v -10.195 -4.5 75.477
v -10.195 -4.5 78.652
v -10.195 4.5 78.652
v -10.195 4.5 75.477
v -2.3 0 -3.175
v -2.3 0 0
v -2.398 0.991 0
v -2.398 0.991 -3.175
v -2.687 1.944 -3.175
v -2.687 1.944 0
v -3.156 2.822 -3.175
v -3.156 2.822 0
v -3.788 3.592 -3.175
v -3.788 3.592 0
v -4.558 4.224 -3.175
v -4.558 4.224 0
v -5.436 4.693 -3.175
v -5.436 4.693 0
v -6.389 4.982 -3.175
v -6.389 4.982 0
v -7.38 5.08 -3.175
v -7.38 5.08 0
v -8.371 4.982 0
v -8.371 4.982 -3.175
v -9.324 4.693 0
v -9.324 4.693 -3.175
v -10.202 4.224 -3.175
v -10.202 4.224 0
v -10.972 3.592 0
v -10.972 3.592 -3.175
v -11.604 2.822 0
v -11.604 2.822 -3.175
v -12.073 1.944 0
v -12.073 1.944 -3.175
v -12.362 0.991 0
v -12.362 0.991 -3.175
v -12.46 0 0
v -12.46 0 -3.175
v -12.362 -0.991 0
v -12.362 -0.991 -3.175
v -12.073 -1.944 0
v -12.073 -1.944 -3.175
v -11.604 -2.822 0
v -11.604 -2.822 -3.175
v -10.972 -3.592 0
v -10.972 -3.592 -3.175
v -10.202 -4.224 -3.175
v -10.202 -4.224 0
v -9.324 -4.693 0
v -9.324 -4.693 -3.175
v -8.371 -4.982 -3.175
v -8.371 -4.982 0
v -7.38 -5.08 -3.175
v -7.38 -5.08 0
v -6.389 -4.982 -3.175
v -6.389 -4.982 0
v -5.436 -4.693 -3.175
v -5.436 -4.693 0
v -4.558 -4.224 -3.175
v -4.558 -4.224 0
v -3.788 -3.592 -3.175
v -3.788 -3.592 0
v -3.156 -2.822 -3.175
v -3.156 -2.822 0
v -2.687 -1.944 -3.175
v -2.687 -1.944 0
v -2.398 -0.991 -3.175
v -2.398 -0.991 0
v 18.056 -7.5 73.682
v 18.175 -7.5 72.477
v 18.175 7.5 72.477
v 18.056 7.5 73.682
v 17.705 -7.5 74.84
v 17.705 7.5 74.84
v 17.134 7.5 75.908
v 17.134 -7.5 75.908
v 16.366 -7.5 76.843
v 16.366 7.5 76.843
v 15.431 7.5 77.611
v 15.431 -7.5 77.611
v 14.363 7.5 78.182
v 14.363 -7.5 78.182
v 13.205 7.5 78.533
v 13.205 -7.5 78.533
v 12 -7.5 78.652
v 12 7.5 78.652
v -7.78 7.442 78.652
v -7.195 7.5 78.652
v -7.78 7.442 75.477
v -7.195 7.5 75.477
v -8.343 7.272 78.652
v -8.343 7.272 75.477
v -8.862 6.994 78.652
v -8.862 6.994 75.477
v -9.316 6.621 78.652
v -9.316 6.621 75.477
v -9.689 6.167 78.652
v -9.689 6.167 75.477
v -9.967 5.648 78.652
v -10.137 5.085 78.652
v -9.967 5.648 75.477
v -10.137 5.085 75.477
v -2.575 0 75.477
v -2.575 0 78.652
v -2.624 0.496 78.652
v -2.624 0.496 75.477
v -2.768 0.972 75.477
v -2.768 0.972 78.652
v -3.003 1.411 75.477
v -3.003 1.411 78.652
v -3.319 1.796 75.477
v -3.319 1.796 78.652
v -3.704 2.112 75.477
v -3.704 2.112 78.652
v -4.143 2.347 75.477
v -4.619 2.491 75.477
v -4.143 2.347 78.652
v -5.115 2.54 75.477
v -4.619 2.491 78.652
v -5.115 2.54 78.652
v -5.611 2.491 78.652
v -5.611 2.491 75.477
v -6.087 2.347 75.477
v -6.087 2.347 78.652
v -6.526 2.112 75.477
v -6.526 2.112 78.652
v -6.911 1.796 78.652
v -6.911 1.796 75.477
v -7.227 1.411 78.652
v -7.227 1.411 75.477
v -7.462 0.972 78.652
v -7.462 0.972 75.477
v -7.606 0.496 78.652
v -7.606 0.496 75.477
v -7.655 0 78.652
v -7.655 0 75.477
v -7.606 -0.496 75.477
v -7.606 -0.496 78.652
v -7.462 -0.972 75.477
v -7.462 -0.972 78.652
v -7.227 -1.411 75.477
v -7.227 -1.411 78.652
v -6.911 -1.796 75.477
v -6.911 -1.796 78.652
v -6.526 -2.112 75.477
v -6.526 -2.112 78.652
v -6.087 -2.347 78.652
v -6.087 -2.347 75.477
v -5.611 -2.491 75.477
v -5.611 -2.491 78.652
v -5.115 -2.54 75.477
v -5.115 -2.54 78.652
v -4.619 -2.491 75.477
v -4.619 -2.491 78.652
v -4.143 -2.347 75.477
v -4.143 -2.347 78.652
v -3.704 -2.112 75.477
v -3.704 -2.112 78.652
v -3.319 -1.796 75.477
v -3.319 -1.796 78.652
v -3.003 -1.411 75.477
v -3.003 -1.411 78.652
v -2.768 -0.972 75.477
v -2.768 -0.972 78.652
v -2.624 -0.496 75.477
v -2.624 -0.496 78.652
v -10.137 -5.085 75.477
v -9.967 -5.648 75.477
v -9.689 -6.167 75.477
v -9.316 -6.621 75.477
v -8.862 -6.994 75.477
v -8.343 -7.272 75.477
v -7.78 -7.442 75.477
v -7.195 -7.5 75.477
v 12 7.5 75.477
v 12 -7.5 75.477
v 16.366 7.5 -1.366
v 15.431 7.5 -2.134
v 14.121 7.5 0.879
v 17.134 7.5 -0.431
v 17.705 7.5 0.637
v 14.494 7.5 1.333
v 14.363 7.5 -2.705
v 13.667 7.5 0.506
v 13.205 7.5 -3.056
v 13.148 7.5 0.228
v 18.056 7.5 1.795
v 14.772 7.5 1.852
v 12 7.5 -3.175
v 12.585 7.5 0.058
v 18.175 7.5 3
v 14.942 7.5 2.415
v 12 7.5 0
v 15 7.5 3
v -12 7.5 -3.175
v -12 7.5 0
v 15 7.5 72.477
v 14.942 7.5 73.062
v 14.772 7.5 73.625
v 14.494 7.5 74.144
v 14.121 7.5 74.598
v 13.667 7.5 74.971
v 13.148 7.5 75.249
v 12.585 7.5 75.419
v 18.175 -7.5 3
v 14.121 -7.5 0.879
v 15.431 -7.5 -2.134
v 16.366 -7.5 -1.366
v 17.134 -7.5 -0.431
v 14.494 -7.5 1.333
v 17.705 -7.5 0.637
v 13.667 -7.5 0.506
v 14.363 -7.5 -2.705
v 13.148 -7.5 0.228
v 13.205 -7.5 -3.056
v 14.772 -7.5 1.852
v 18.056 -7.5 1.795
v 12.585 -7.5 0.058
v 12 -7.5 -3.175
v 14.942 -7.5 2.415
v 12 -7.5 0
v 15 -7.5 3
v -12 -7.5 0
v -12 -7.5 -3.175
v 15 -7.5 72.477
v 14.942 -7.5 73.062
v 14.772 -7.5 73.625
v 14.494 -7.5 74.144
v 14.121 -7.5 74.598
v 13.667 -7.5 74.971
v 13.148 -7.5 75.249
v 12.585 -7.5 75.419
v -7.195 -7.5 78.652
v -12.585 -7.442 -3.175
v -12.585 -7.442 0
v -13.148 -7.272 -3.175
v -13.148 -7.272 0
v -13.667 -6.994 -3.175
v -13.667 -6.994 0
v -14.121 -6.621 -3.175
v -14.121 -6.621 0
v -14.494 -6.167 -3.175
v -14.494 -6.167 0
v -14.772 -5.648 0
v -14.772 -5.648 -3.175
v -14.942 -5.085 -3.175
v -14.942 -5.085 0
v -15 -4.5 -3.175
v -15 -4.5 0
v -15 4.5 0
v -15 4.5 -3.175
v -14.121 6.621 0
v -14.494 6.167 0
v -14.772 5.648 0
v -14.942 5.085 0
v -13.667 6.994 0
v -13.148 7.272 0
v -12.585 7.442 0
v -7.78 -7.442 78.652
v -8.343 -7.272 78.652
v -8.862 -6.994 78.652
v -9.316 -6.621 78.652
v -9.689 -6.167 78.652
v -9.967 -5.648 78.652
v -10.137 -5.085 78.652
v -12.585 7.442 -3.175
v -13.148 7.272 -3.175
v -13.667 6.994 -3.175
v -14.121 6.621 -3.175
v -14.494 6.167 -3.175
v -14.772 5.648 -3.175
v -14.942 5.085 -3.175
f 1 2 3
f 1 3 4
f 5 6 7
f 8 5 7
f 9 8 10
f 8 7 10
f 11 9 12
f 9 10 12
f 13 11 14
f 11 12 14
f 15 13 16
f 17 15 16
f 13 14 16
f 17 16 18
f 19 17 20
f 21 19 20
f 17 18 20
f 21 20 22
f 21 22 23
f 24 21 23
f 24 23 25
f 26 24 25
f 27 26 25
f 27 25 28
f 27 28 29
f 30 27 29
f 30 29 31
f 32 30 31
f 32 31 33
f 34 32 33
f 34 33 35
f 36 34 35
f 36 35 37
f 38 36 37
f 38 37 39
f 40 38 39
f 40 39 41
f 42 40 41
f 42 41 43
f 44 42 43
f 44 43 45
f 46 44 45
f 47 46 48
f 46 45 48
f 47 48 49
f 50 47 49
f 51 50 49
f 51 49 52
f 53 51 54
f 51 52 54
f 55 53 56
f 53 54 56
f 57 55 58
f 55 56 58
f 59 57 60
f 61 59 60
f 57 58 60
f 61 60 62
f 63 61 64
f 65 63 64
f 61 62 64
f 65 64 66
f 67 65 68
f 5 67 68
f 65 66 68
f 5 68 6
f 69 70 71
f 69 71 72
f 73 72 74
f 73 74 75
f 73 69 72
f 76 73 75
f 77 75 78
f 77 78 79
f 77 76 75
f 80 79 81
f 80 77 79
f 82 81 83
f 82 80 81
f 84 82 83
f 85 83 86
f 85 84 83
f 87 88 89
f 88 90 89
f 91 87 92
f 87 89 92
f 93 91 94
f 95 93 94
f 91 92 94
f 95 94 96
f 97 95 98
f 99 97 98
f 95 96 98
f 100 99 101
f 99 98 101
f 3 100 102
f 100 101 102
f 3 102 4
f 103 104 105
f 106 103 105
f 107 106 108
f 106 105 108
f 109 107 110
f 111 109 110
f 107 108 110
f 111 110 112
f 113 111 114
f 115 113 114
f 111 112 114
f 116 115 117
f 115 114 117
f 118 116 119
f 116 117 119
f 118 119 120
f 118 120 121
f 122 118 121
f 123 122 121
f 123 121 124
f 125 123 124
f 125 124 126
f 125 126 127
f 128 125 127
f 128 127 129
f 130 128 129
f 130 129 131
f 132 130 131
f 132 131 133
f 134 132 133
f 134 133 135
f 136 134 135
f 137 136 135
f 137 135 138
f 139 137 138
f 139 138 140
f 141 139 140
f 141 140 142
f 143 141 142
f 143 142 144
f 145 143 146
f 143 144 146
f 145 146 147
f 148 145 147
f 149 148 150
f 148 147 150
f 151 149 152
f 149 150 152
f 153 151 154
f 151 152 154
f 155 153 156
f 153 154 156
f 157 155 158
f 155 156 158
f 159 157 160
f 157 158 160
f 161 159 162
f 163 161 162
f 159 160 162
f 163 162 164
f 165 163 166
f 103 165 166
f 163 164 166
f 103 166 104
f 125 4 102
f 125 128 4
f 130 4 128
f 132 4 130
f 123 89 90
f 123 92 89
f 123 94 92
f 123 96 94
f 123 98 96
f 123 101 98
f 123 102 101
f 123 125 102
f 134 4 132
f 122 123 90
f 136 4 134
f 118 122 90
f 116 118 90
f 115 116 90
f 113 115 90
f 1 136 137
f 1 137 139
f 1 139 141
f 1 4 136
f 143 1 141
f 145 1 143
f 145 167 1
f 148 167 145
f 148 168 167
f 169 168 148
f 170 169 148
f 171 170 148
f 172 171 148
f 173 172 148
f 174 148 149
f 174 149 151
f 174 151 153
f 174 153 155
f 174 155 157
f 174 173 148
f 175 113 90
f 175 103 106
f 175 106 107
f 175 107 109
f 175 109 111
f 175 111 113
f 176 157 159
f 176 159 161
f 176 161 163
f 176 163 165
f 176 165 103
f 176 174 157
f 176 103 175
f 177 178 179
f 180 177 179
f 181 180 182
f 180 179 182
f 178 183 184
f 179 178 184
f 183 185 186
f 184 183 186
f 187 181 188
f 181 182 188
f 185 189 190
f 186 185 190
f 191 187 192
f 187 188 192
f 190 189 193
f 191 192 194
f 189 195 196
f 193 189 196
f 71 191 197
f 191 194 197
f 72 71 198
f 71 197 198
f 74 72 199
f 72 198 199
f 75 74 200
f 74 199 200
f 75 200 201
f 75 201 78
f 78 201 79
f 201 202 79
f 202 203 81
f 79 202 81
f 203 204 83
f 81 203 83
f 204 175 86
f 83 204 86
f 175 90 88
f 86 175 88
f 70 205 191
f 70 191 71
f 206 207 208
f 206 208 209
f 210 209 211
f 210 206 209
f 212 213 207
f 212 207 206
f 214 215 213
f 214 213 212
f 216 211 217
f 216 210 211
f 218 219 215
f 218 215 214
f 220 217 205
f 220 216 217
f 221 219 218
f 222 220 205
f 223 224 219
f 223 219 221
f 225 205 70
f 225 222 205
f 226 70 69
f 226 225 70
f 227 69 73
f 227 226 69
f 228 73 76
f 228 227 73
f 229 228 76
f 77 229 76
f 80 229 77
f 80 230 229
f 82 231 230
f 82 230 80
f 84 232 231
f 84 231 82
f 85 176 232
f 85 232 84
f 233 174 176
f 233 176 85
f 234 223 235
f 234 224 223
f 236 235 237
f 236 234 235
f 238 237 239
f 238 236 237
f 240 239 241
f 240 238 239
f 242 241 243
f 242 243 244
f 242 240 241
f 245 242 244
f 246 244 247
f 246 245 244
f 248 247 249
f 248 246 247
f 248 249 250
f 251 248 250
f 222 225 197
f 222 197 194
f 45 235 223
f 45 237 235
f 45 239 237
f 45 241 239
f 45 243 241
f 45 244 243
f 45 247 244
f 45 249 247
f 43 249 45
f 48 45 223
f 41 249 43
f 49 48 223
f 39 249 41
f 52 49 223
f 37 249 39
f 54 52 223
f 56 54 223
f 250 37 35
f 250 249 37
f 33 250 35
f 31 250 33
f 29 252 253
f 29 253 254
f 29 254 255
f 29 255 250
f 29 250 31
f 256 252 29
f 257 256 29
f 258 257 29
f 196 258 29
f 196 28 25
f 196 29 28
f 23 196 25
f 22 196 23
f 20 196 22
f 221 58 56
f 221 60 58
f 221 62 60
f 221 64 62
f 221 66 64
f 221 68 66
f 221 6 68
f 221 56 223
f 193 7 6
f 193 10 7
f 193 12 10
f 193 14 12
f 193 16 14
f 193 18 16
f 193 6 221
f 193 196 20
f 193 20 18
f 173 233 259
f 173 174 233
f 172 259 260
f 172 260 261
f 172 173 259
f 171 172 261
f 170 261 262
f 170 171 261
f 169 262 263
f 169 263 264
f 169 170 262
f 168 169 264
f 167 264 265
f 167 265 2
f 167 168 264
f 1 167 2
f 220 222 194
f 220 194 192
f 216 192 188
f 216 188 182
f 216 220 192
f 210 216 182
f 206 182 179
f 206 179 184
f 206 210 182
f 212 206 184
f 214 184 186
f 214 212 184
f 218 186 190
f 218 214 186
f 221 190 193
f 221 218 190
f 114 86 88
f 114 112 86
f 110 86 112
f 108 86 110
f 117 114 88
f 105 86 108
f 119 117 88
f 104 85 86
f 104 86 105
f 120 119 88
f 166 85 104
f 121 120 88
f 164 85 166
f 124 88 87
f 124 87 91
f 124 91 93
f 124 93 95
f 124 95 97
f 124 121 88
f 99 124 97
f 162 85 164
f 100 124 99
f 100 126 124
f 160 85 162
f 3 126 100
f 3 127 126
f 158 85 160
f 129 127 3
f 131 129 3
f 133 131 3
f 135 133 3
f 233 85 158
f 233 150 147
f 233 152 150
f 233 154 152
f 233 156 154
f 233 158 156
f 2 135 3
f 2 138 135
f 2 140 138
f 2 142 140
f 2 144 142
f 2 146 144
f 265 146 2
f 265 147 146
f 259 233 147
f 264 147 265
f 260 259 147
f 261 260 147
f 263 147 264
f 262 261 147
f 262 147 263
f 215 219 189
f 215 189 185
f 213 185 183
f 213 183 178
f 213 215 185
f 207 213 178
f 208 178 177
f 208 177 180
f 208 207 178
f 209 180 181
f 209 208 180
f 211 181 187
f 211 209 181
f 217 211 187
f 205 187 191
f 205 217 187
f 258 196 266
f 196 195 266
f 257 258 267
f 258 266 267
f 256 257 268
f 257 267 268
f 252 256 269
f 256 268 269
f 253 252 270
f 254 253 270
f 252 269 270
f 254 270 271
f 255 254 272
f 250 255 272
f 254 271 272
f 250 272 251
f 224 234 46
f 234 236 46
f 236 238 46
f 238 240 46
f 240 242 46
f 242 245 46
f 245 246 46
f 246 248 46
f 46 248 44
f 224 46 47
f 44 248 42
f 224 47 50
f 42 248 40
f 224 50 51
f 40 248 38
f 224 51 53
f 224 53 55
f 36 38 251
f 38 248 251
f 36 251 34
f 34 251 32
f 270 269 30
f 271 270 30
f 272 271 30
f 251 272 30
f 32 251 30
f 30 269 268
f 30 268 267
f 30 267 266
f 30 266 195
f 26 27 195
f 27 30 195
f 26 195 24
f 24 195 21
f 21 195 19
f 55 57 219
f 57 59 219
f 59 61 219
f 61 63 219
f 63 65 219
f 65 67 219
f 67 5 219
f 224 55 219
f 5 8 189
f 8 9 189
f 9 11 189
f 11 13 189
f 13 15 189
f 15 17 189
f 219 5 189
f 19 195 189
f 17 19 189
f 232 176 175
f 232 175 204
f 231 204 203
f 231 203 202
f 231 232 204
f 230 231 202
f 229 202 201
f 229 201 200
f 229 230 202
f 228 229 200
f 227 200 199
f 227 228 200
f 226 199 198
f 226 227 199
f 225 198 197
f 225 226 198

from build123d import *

# Parameters (mm, degrees)
SKETCH1_W                    = 30
SKETCH1_H                    = 15
BASE_FLANGE1_DEPTH           = 3.175
EDGE_FLANGE1_STRIP_W         = 18.7
EDGE_FLANGE1_STRIP_H         = 3.175
EDGE_FLANGE1_STRIP_CUT_DEPTH = 15
EDGE_FLANGE1_DEPTH           = 15
EDGE_FLANGE2_STRIP_W         = 18.7
EDGE_FLANGE2_STRIP_H         = 3.175
EDGE_FLANGE2_STRIP_CUT_DEPTH = 15
EDGE_FLANGE2_DEPTH           = 15
SKETCH14_R                   = 5.08
CUT_EXTRUDE1_DEPTH           = 82.072299394
SKETCH15_R                   = 2.54
CUT_EXTRUDE2_DEPTH           = 10
FILLET1_R                    = 3


# Sheet-metal steps are written as plain solids
with BuildPart() as part:
    # Sketch1 → Base-Flange1 (new body)
    with BuildSketch(Plane.XY):
        Rectangle(SKETCH1_W, SKETCH1_H)
    extrude(amount=-BASE_FLANGE1_DEPTH)

    # Edge-Flange1 strip (across the edge) → Edge-Flange1 strip cut (cut)
    with BuildSketch(Plane(origin=(15, -7.5, 0), x_dir=(-1, 0, 0), z_dir=(0, 1, 0))):
        with Locations((-6.35, -1.5875)):
            Rectangle(EDGE_FLANGE1_STRIP_W, EDGE_FLANGE1_STRIP_H)
    extrude(amount=EDGE_FLANGE1_STRIP_CUT_DEPTH, mode=Mode.SUBTRACT)

    # Edge-Flange1 section (across the edge) → Edge-Flange1 (add)
    with BuildSketch(Plane(origin=(15, -7.5, 0), x_dir=(-1, 0, 0), z_dir=(0, 1, 0))):
        with BuildLine():
            Line((-3.175, 3), (-3.175, 75.477))
            Line((-3.175, 75.477), (0, 75.477))
            Line((0, 75.477), (0, 3))
            ThreePointArc((0, 3), (0.878679656, 0.878679656), (3, 0))
            Line((3, 0), (3, -3.175))
            ThreePointArc((3, -3.175), (-1.366384374, -1.366384374), (-3.175, 3))
        make_face()
    extrude(amount=EDGE_FLANGE1_DEPTH)

    # Edge-Flange2 strip (across the edge) → Edge-Flange2 strip cut (cut)
    with BuildSketch(Plane(origin=(15, -7.5, 75.477), x_dir=(0, 0, -1), z_dir=(0, 1, 0))):
        with Locations((-6.35, -1.5875)):
            Rectangle(EDGE_FLANGE2_STRIP_W, EDGE_FLANGE2_STRIP_H)
    extrude(amount=EDGE_FLANGE2_STRIP_CUT_DEPTH, mode=Mode.SUBTRACT)

    # Edge-Flange2 section (across the edge) → Edge-Flange2 (add)
    with BuildSketch(Plane(origin=(15, -7.5, 75.477), x_dir=(0, 0, -1), z_dir=(0, 1, 0))):
        with BuildLine():
            Line((-3.175, 3), (-3.175, 25.195))
            Line((-3.175, 25.195), (0, 25.195))
            Line((0, 25.195), (0, 3))
            ThreePointArc((0, 3), (0.878679656, 0.878679656), (3, 0))
            Line((3, 0), (3, -3.175))
            ThreePointArc((3, -3.175), (-1.366384374, -1.366384374), (-3.175, 3))
        make_face()
    extrude(amount=EDGE_FLANGE2_DEPTH)

    # Sketch14 → Cut-Extrude1 (cut, through all)
    with BuildSketch(Plane.XY):
        with Locations((-7.38, 0)):
            Circle(SKETCH14_R)
    extrude(amount=-CUT_EXTRUDE1_DEPTH, mode=Mode.SUBTRACT)

    # Sketch15 → Cut-Extrude2 (cut)
    with BuildSketch(Plane.XY.offset(78.652)):
        with Locations((-5.115, 0)):
            Circle(SKETCH15_R)
    extrude(amount=-CUT_EXTRUDE2_DEPTH, mode=Mode.SUBTRACT)

    # Fillet1
    fillet1_edges = [part.edges().sort_by_distance(p)[0] for p in [
        (-10.195, -7.5, 77.0645),
        (-10.195, 7.5, 77.0645),
        (-15, -7.5, -1.5875),
        (-15, 7.5, -1.5875),
    ]]
    fillet(fillet1_edges, radius=FILLET1_R)


solid = part.part
